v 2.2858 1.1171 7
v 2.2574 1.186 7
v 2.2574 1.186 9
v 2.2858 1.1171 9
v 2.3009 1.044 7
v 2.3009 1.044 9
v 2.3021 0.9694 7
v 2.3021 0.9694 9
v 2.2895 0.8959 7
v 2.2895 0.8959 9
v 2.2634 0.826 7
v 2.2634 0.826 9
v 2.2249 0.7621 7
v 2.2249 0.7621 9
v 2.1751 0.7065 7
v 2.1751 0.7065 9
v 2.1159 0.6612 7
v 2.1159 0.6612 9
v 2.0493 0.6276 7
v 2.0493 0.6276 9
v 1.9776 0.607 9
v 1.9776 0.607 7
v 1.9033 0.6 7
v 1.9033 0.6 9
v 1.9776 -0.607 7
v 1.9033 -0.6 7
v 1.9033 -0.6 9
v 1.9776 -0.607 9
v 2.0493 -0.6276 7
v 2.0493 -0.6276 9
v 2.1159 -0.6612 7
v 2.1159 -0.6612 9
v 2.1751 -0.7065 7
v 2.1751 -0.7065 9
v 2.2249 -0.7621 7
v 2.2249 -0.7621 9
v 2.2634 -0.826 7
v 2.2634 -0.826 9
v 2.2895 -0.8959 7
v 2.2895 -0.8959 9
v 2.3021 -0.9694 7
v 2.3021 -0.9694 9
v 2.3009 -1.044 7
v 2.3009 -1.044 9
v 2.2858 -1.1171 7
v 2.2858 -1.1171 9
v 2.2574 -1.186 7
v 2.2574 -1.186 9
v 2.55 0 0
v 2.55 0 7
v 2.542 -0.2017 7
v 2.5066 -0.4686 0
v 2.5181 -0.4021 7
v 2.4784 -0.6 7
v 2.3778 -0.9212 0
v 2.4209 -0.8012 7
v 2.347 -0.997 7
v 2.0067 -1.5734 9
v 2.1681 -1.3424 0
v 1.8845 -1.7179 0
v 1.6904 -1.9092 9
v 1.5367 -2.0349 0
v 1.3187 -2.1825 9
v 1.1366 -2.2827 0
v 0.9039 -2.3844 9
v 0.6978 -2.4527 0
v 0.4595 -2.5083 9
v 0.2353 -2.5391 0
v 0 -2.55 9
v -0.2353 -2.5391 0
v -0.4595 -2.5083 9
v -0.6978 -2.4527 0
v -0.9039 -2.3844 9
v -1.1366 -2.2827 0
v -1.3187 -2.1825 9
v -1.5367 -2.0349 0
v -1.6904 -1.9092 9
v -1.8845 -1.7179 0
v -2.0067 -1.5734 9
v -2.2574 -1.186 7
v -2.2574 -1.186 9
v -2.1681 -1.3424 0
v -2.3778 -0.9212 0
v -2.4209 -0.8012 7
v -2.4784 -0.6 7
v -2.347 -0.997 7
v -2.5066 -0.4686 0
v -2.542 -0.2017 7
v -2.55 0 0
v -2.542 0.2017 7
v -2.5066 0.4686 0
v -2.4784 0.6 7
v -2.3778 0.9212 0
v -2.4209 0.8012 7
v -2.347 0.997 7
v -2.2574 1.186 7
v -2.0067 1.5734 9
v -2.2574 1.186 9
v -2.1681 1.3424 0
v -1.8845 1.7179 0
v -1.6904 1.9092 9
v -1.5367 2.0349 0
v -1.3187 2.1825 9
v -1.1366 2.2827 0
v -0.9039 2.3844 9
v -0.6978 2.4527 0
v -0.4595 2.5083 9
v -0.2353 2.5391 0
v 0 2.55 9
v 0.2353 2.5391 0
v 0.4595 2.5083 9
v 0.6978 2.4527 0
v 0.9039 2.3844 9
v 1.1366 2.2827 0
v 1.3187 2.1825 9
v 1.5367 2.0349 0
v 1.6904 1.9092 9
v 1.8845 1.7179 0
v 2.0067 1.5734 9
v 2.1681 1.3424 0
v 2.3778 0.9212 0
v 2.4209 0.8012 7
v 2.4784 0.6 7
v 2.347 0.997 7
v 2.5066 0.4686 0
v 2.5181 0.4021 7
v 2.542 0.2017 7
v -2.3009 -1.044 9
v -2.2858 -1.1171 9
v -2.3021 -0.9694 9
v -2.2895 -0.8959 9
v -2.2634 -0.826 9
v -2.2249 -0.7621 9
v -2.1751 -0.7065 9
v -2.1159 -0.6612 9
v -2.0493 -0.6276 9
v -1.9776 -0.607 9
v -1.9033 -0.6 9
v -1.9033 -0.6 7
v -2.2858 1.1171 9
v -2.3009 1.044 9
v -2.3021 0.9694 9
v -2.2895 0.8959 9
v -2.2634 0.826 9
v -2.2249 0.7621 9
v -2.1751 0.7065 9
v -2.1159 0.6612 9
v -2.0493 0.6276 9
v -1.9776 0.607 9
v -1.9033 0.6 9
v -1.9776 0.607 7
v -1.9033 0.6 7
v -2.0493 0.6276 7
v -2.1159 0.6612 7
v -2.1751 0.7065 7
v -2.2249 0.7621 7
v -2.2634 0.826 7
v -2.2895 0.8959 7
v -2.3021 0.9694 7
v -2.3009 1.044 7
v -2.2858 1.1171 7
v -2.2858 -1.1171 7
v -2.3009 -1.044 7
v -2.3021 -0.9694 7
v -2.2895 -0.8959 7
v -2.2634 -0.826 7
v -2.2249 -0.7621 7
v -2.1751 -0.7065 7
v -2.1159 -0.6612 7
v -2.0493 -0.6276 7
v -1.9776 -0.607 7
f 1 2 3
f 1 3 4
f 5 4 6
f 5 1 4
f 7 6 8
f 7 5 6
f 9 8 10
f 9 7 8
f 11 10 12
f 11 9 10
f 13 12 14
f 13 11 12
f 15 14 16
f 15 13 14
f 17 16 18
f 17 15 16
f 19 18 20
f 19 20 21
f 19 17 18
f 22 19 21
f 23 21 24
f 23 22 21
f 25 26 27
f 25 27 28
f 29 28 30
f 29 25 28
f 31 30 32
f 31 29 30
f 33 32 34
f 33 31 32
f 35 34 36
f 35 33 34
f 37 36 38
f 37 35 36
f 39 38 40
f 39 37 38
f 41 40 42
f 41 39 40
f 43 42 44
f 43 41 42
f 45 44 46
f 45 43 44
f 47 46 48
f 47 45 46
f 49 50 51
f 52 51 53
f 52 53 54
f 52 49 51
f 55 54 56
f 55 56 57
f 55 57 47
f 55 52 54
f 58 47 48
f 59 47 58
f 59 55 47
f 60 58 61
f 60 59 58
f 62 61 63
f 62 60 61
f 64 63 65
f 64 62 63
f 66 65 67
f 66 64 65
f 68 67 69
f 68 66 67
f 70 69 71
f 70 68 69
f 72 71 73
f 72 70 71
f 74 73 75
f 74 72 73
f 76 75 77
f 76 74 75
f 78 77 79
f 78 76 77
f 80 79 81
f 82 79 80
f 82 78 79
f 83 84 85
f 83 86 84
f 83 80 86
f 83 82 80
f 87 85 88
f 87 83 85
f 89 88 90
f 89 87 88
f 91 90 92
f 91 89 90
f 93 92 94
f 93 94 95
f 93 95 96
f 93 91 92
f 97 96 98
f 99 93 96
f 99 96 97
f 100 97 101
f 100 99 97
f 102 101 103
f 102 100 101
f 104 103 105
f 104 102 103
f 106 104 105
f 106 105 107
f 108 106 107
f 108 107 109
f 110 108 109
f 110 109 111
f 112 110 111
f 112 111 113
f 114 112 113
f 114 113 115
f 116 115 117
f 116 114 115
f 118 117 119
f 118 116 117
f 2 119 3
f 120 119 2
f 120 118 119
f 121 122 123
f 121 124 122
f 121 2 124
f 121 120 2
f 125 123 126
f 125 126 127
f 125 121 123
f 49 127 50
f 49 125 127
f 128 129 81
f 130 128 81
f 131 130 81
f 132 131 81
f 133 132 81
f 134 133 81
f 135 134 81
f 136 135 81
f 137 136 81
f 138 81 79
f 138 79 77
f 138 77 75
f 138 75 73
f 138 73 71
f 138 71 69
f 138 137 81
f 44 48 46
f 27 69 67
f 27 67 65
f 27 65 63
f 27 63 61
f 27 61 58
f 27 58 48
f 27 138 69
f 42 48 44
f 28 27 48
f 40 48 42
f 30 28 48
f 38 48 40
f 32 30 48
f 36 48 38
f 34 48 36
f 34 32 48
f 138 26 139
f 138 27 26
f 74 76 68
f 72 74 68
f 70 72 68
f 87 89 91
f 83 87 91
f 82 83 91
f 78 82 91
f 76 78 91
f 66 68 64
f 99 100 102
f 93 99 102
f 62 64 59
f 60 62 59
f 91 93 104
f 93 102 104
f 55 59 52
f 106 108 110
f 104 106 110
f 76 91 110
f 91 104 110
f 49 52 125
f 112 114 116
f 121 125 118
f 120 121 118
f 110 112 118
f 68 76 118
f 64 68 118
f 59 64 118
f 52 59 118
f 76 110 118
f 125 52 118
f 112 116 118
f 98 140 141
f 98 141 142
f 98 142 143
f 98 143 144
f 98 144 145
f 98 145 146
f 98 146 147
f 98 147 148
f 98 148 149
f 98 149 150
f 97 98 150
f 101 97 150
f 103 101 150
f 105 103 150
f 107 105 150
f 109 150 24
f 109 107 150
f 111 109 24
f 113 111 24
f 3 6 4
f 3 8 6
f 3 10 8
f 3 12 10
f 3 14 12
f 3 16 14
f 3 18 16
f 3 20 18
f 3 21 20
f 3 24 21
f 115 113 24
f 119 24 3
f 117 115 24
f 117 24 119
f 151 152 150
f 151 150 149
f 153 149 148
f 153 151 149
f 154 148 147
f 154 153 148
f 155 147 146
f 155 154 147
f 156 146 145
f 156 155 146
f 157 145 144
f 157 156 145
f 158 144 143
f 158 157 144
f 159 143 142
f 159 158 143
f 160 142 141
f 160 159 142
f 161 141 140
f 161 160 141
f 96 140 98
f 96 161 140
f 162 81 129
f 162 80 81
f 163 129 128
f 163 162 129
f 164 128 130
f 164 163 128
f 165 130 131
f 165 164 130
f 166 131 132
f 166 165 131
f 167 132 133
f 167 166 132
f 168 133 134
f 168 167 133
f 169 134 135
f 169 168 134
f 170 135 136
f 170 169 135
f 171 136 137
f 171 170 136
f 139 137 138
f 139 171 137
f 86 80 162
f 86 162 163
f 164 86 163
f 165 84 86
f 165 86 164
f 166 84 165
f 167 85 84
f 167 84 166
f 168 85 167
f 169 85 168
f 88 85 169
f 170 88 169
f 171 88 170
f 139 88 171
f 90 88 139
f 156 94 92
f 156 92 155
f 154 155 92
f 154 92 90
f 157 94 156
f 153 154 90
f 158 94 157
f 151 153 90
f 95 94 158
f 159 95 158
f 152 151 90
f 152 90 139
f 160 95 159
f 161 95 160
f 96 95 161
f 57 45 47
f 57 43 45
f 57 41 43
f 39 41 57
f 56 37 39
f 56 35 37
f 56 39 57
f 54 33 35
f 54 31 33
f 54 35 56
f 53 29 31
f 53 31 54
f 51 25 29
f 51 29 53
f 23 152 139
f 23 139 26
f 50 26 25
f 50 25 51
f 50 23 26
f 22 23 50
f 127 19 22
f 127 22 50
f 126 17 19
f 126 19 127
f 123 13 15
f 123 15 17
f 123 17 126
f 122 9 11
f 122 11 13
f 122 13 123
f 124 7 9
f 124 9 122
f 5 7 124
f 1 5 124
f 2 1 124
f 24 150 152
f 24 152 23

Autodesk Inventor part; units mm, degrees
ref_plane "YZ Plane" through (0, 0, 0) normal (1, 0, 0) x (0, 1, 0)
ref_plane "XZ Plane" through (0, 0, 0) normal (0, 1, 0) x (-1, 0, 0)
ref_plane "XY Plane" through (0, 0, 0) normal (0, 0, 1) x (1, 0, 0)
sketch "Эскиз1" plane through (0, 0, 0) normal (0, 0, 1) x (1, 0, 0)
  circle A0 centre (0, 0) radius 2.55
  dimension "d0" = 5.1
extrude "Выдавливание1" add sketch "Эскиз1" along normal blind 9
sketch "Эскиз2" plane through (0, 0, 9) normal (0, 0, 1) x (1, 0, 0)
  line L0 (2.55, -0.6) -> (-2.55, -0.6)
  line L1 (-2.55, -0.6) -> (-2.55, 0.6)
  line L2 (-2.55, 0.6) -> (2.55, 0.6)
  line L3 (2.55, 0.6) -> (2.55, -0.6)
  line L4 (2.55, -0.6) -> (-2.55, 0.6) construction
  line L5 (-2.55, -0.6) -> (2.55, 0.6) construction
  circle A0 centre (0, 0) radius 2.55 construction
  point P0 (0, 0)
  dimension "d3" = 1.2
extrude "Выдавливание2" cut sketch "Эскиз2" against normal blind 2
fillet "Сопряжение1" radius 0.4 4 edges at (2.4784, 0.6, 8) (-2.4784, 0.6, 8) (-2.4784, -0.6, 8) (2.4784, -0.6, 8)
properties part number "Шпунтик"
